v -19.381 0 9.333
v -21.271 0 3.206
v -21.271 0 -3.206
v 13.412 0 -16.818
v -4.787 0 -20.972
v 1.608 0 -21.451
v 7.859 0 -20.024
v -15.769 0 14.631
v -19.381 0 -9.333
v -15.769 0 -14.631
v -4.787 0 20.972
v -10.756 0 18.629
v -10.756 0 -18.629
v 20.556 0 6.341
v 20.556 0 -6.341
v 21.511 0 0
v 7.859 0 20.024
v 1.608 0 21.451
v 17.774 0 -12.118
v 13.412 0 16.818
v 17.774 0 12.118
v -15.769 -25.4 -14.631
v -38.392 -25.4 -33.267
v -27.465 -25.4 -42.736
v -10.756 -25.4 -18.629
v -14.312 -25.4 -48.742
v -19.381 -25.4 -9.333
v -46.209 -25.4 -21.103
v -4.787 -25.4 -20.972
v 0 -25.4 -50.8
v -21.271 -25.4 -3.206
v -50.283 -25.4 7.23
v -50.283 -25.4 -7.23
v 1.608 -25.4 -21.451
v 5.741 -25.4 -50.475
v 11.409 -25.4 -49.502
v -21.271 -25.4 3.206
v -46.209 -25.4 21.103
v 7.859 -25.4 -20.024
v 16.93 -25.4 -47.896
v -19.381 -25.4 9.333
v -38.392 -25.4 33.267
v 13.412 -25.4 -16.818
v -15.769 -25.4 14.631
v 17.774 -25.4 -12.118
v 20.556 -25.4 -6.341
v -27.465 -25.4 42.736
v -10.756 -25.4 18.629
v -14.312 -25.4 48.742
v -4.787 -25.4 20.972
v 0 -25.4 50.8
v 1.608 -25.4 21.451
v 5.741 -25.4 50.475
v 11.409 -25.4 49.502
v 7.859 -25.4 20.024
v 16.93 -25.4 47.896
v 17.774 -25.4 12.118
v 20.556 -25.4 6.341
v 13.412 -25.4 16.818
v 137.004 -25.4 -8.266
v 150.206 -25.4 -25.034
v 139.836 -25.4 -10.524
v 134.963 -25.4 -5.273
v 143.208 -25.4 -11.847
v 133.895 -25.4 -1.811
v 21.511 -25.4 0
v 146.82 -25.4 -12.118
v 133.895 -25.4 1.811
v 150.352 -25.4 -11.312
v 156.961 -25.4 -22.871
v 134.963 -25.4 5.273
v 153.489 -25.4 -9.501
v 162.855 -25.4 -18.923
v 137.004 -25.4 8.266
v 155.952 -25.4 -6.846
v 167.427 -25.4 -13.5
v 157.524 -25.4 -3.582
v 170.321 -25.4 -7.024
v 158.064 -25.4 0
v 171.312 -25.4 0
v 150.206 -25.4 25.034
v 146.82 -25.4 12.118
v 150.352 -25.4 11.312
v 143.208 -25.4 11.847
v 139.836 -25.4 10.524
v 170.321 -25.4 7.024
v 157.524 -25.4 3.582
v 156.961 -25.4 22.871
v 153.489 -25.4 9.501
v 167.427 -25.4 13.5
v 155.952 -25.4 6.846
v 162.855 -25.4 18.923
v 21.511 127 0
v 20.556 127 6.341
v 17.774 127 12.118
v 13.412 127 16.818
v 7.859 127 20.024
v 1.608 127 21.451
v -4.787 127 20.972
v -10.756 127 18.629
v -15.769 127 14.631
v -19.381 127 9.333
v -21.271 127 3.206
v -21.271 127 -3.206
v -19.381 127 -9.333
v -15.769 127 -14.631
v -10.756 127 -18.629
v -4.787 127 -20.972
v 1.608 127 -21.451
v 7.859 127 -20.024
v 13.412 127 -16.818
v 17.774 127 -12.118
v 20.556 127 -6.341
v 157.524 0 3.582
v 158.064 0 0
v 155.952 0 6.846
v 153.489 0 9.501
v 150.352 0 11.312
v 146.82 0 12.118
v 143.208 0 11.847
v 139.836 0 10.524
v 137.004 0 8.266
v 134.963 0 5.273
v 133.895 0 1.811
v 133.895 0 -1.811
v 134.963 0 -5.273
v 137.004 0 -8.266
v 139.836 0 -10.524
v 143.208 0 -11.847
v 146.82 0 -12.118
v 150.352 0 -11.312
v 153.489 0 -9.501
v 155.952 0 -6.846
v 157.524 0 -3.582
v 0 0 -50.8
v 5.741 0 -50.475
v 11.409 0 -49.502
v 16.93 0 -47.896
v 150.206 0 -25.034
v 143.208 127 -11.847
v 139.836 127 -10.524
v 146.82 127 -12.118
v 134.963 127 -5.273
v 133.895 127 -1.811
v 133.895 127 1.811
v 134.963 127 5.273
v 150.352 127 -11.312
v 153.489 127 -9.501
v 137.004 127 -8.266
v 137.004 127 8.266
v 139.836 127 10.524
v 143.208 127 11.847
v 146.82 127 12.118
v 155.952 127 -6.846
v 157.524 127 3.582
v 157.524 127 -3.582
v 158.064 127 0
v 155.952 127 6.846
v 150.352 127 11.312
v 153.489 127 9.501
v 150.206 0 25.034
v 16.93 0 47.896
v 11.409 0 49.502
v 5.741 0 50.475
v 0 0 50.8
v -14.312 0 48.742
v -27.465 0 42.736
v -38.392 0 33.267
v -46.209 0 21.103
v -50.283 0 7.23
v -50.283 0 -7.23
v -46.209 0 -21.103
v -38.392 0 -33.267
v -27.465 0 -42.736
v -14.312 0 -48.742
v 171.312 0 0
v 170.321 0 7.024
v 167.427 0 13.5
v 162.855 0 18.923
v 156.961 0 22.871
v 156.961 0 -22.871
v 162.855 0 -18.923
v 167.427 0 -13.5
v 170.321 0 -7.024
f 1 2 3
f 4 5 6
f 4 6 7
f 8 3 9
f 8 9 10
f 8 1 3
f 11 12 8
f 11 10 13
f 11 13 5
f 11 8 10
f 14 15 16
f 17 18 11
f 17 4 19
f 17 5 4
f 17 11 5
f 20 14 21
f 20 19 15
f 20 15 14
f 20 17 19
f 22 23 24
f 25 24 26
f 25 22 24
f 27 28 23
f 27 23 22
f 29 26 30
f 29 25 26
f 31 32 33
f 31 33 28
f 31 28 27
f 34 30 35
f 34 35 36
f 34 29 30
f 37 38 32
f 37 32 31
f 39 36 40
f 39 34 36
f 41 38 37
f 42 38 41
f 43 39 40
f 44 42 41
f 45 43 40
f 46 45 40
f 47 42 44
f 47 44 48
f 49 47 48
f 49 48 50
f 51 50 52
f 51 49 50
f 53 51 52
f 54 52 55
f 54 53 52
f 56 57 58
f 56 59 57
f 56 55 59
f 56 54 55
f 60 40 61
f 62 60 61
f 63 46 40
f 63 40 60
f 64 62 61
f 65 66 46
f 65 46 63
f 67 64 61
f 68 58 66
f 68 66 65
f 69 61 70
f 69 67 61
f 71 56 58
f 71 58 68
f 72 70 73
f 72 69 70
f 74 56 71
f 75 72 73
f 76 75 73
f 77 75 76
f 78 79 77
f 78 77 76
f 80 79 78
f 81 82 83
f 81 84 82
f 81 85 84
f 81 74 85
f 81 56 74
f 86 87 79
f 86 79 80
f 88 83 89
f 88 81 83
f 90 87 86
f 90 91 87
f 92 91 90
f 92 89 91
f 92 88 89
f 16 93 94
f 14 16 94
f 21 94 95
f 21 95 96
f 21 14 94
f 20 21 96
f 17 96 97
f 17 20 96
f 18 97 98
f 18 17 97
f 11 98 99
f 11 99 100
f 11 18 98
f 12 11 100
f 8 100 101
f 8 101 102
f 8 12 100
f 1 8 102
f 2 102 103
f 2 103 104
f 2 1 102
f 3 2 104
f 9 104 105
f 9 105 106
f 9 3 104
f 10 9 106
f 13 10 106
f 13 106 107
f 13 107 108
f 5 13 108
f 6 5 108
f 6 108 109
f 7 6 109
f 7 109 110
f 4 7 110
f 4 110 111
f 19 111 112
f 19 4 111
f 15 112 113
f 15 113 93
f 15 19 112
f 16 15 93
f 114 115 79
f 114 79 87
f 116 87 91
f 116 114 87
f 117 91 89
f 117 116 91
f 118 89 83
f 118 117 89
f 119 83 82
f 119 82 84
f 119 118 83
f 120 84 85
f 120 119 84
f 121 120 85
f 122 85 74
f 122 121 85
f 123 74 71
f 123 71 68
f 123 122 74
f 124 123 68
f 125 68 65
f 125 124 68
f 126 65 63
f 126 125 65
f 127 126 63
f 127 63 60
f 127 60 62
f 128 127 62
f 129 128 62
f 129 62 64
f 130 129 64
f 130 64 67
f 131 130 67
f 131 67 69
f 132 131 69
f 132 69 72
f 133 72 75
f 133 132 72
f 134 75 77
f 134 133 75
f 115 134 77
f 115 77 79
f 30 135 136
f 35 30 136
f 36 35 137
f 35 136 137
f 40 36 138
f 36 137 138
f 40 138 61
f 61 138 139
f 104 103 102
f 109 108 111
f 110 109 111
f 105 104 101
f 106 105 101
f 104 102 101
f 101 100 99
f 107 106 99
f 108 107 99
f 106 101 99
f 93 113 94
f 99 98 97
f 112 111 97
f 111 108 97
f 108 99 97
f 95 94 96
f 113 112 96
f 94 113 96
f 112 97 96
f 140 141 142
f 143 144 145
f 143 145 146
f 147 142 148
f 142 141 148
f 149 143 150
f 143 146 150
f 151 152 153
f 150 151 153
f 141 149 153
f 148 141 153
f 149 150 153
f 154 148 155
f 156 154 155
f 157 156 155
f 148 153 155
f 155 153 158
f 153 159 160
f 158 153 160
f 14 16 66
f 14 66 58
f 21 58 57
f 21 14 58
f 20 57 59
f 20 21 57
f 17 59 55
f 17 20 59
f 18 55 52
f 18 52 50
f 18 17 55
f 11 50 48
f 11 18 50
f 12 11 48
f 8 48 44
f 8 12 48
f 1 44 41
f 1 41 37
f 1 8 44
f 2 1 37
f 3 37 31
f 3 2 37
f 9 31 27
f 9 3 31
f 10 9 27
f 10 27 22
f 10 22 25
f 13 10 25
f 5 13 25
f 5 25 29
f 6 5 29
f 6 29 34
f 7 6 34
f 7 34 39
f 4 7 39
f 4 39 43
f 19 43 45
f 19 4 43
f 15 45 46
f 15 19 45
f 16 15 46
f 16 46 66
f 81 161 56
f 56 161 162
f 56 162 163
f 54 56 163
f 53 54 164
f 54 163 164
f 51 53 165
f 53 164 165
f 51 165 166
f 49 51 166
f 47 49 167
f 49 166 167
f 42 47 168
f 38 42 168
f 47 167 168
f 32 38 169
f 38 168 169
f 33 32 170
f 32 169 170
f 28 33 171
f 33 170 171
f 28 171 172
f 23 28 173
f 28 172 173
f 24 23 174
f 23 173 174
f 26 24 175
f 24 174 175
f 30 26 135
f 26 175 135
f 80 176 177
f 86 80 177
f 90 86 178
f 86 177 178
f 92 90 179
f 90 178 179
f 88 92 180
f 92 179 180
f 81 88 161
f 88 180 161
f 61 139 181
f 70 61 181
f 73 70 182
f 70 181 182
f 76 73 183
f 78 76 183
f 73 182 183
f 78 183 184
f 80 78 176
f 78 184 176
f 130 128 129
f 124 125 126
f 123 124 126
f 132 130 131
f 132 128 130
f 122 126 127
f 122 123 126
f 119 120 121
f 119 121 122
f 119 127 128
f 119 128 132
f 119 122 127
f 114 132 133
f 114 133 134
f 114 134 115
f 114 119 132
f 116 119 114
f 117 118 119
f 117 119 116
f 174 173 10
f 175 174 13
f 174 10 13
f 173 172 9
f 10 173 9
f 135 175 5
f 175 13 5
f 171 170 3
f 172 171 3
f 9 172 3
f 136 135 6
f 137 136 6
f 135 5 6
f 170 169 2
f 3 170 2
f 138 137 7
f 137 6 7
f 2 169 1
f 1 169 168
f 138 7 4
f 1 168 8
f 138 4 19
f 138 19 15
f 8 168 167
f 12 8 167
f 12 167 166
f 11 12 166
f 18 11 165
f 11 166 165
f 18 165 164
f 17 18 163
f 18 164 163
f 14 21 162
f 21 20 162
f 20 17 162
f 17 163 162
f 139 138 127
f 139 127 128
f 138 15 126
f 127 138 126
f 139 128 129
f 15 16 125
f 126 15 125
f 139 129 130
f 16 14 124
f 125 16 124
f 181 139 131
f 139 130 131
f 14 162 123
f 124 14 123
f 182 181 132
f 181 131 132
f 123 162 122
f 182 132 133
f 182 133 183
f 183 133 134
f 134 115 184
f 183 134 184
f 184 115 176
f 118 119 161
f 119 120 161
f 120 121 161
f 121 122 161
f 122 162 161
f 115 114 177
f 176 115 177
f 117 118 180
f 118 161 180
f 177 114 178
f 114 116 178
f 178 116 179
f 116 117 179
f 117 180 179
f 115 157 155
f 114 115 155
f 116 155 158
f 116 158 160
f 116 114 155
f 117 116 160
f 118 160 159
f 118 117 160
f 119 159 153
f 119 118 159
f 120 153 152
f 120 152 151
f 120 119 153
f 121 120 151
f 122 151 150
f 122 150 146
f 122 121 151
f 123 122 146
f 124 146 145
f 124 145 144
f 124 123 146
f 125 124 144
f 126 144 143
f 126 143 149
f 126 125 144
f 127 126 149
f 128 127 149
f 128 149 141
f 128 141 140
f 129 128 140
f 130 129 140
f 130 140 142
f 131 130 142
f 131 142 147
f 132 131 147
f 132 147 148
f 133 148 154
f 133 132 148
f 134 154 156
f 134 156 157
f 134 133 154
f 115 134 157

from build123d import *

# Parameters (mm, degrees)
F0_R     = 21.511444
F0_R_2   = 12.152123
F1_DEPTH = 25.4
F2_DEPTH = 127


with BuildPart() as f1:
    # F0 (on Front) → F1 (new body)
    with BuildSketch(Plane.XZ):
        with BuildLine():
            Line((16.929824, 47.89594), (0, 50.8))
            ThreePointArc((0, 50.8), (-50.8, 0), (0, -50.8))
            Line((0, -50.8), (16.929824, -47.89594))
            ThreePointArc((16.929824, -47.89594), (41.476952, -29.330913), (50.8, 0))
            ThreePointArc((50.8, 0), (41.476952, 29.330913), (16.929824, 47.89594))
        make_face()
        Circle(F0_R, mode=Mode.SUBTRACT)
        with BuildLine():
            ThreePointArc((16.929824, 47.89594), (8.588546, 50.068721), (0, 50.8))
            Line((0, 50.8), (16.929824, 47.89594))
        make_face()
        with BuildLine():
            Line((16.929824, -47.89594), (0, -50.8))
            ThreePointArc((0, -50.8), (8.588546, -50.068721), (16.929824, -47.89594))
        make_face()
        with BuildLine():
            Line((150.206164, 25.034361), (16.929824, 47.89594))
            ThreePointArc((16.929824, 47.89594), (41.476952, 29.330913), (50.8, 0))
            ThreePointArc((50.8, 0), (41.476952, -29.330913), (16.929824, -47.89594))
            Line((16.929824, -47.89594), (150.206164, -25.034361))
            ThreePointArc((150.206164, -25.034361), (120.511891, 0), (150.206164, 25.034361))
        make_face()
        with BuildLine():
            ThreePointArc((171.311891, 0), (165.331399, 16.372011), (150.206164, 25.034361))
            ThreePointArc((150.206164, 25.034361), (120.511891, 0), (150.206164, -25.034361))
            ThreePointArc((150.206164, -25.034361), (165.331399, -16.372011), (171.311891, 0))
        make_face()
        with Locations((145.911891, 0)):
            Circle(F0_R_2, mode=Mode.SUBTRACT)
    extrude(amount=F1_DEPTH)


with BuildPart() as f2:
    # F0 (on Front) → F2 (new body)
    with BuildSketch(Plane.XZ):
        Circle(F0_R)
        with Locations((145.911891, 0)):
            Circle(F0_R_2)
    extrude(amount=-F2_DEPTH)


solid = Compound([f1.part, f2.part])
